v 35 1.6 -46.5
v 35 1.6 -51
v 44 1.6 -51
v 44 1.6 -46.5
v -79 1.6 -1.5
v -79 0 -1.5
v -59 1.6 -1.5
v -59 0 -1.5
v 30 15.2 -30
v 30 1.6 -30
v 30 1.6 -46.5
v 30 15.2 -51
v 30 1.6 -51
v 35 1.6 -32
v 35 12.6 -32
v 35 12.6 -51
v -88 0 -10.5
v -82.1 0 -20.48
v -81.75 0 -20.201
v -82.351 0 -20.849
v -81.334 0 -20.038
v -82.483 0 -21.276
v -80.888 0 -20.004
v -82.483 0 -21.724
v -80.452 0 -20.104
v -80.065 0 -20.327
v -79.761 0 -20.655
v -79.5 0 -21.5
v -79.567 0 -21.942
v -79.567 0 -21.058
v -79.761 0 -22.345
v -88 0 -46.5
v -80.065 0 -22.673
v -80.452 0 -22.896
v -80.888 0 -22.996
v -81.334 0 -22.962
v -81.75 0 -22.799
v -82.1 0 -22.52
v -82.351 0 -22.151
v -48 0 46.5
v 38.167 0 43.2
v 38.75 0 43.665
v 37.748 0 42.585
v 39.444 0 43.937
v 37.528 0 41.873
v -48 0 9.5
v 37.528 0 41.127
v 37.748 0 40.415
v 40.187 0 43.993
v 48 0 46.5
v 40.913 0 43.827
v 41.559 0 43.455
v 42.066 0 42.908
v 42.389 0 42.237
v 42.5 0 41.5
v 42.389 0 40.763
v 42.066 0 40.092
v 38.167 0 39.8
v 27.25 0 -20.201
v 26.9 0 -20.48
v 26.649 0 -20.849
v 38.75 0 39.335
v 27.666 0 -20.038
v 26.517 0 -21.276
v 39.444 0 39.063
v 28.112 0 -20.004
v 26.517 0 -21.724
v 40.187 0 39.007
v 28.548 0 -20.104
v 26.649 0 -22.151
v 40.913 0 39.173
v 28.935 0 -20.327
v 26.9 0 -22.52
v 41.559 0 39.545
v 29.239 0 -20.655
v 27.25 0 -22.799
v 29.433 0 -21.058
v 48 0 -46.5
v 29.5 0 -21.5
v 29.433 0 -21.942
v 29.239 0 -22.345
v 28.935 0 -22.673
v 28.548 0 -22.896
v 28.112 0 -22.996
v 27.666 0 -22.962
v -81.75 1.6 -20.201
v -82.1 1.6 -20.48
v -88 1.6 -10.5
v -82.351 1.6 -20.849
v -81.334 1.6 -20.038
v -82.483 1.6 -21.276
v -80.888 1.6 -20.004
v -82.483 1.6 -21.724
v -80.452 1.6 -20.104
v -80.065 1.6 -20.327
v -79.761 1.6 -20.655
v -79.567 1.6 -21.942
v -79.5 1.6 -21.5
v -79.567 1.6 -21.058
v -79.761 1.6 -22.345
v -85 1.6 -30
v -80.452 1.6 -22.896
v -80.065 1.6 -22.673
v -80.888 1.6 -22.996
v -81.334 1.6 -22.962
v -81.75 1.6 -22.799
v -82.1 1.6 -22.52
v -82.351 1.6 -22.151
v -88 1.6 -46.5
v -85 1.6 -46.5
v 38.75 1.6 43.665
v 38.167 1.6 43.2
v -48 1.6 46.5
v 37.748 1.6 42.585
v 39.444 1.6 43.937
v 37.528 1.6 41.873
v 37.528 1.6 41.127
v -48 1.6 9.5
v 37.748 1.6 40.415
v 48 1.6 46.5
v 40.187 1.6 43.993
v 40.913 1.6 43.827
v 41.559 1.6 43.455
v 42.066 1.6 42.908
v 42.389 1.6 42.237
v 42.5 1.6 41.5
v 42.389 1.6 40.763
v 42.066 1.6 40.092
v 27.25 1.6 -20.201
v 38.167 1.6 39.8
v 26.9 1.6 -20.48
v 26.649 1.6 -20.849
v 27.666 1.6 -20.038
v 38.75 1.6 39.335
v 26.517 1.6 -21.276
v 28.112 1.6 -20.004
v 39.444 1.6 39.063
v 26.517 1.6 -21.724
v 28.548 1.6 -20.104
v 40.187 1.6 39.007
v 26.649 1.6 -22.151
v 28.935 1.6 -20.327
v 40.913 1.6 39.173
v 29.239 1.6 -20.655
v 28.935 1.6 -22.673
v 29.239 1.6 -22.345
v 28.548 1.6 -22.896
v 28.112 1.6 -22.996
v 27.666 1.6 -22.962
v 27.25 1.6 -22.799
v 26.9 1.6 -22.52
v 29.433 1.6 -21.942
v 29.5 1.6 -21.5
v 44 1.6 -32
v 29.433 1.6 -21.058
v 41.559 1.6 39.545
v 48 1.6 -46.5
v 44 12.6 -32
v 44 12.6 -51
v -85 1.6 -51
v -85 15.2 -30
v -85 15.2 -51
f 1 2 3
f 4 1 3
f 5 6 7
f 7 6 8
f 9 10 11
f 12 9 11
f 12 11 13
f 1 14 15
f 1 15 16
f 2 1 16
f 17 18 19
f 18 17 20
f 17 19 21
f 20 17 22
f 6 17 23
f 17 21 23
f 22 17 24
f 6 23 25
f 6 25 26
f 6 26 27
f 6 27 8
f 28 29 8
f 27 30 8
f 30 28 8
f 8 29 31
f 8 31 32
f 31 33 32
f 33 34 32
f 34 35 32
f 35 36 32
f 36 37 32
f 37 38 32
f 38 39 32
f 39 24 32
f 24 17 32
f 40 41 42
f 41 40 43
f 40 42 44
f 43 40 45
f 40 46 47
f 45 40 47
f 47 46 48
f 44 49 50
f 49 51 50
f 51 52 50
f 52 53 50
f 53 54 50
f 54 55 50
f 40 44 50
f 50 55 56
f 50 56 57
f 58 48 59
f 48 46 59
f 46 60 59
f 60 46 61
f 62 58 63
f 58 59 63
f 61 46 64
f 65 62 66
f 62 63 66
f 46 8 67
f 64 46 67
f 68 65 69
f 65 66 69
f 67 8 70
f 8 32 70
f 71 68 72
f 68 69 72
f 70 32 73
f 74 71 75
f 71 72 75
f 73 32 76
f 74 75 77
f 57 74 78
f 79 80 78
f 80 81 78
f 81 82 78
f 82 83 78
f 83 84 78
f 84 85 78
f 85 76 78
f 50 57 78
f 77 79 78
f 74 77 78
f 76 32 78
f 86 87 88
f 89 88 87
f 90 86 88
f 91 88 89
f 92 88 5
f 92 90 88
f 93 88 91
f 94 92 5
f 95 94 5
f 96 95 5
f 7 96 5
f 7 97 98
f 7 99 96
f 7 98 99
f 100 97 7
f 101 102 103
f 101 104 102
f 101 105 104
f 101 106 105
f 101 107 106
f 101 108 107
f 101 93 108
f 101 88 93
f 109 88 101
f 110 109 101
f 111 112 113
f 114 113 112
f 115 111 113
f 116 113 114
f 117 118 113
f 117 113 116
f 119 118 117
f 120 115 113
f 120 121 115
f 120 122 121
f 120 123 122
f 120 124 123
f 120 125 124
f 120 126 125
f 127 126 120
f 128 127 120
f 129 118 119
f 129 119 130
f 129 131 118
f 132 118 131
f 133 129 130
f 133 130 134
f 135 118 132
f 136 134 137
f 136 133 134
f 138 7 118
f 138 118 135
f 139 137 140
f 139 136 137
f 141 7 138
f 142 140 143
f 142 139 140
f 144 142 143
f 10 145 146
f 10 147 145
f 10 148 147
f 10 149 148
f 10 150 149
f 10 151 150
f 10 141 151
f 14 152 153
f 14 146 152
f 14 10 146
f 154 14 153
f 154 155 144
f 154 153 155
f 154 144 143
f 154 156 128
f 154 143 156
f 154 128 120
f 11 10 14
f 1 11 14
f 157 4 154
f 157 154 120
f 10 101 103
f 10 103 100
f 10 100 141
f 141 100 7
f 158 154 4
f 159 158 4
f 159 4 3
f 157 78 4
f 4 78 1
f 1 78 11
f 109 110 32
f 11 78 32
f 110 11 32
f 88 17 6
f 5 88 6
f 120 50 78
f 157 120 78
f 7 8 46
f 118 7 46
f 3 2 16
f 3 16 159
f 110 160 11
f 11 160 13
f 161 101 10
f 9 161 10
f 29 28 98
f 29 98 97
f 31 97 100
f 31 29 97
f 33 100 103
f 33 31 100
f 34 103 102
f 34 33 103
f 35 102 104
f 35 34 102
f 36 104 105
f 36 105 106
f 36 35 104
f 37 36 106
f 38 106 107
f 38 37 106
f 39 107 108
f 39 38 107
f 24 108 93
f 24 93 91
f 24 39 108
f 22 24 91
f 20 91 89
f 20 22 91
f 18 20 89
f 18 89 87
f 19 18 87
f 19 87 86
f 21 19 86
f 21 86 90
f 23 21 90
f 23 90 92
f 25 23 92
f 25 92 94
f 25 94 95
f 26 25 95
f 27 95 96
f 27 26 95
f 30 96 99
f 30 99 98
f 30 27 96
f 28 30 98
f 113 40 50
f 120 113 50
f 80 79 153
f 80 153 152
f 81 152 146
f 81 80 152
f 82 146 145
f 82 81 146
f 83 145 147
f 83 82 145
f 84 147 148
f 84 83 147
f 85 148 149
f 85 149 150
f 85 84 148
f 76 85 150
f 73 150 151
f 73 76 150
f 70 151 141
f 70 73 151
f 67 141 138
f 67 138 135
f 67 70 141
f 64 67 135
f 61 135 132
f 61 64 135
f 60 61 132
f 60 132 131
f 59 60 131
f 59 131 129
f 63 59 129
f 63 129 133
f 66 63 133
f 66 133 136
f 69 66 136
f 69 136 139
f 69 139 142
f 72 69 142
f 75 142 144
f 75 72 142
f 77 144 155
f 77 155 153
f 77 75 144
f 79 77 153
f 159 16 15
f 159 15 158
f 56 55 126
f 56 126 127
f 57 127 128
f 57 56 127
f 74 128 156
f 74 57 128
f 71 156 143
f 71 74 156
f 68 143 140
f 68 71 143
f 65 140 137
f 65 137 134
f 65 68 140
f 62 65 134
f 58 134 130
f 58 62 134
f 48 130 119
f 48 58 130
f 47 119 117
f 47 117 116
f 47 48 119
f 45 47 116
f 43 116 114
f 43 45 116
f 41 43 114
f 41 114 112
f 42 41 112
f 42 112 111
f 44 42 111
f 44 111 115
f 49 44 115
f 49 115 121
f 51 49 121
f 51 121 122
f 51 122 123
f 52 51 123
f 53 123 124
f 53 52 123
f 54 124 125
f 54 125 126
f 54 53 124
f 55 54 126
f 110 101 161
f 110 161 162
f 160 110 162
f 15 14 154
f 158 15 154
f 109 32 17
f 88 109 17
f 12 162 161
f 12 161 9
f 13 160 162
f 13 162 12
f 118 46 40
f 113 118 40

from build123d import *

# Parameters (mm, degrees)
BOSS_EXTRUDE1_DEPTH      = 1.6
SKETCH2_W                = 115
SKETCH2_H                = 21
BOSS_EXTRUDE2_DEPTH      = 13.6
CUT_EXTRUDE1_OUTLINE_R   = 2.5
CUT_EXTRUDE1_OUTLINE_R_2 = 1.5
CUT_EXTRUDE1_DEPTH       = 1.6
SKETCH5_W                = 9
SKETCH5_H                = 19
BOSS_EXTRUDE3_DEPTH      = 11


# Read off the part's stored shape, not the designer's step: Cut-Extrude1
with BuildPart() as part:
    # Sketch1 (on Top Plane) → Boss-Extrude1 (new body)
    with BuildSketch(Plane(origin=(0, 0, 0), x_dir=(1, 0, 0), z_dir=(0, 1, 0))):
        Polygon((-48, 46.5), (-88, 46.5), (-88, 10.5), (-79, 1.5), (-59, 1.5), (-48, -9.5), (-48, -46.5), (48, -46.5), (48, 46.5), align=None)
    extrude(amount=BOSS_EXTRUDE1_DEPTH)

    # Sketch2 → Boss-Extrude2 (add)
    with BuildSketch(Plane(origin=(0, 1.6, 0), x_dir=(1, 0, 0), z_dir=(0, 1, 0))):
        with Locations((-27.5, 40.5)):
            Rectangle(SKETCH2_W, SKETCH2_H)
    extrude(amount=BOSS_EXTRUDE2_DEPTH)

    # Cut-Extrude1 outline → Cut-Extrude1 (cut)
    with BuildSketch(Plane(origin=(0, 0, 0), x_dir=(1, 0, 0), z_dir=(0, 1, 0))):
        with Locations((40, -41.5)):
            Circle(CUT_EXTRUDE1_OUTLINE_R)
        with Locations((28, 21.5)):
            Circle(CUT_EXTRUDE1_OUTLINE_R_2)
        with Locations((-81, 21.5)):
            Circle(CUT_EXTRUDE1_OUTLINE_R_2)
    extrude(amount=CUT_EXTRUDE1_DEPTH, mode=Mode.SUBTRACT)

    # Sketch5 → Boss-Extrude3 (add)
    with BuildSketch(Plane(origin=(0, 1.6, 0), x_dir=(1, 0, 0), z_dir=(0, 1, 0))):
        with Locations((39.5, 41.5)):
            Rectangle(SKETCH5_W, SKETCH5_H)
    extrude(amount=BOSS_EXTRUDE3_DEPTH)


solid = part.part
